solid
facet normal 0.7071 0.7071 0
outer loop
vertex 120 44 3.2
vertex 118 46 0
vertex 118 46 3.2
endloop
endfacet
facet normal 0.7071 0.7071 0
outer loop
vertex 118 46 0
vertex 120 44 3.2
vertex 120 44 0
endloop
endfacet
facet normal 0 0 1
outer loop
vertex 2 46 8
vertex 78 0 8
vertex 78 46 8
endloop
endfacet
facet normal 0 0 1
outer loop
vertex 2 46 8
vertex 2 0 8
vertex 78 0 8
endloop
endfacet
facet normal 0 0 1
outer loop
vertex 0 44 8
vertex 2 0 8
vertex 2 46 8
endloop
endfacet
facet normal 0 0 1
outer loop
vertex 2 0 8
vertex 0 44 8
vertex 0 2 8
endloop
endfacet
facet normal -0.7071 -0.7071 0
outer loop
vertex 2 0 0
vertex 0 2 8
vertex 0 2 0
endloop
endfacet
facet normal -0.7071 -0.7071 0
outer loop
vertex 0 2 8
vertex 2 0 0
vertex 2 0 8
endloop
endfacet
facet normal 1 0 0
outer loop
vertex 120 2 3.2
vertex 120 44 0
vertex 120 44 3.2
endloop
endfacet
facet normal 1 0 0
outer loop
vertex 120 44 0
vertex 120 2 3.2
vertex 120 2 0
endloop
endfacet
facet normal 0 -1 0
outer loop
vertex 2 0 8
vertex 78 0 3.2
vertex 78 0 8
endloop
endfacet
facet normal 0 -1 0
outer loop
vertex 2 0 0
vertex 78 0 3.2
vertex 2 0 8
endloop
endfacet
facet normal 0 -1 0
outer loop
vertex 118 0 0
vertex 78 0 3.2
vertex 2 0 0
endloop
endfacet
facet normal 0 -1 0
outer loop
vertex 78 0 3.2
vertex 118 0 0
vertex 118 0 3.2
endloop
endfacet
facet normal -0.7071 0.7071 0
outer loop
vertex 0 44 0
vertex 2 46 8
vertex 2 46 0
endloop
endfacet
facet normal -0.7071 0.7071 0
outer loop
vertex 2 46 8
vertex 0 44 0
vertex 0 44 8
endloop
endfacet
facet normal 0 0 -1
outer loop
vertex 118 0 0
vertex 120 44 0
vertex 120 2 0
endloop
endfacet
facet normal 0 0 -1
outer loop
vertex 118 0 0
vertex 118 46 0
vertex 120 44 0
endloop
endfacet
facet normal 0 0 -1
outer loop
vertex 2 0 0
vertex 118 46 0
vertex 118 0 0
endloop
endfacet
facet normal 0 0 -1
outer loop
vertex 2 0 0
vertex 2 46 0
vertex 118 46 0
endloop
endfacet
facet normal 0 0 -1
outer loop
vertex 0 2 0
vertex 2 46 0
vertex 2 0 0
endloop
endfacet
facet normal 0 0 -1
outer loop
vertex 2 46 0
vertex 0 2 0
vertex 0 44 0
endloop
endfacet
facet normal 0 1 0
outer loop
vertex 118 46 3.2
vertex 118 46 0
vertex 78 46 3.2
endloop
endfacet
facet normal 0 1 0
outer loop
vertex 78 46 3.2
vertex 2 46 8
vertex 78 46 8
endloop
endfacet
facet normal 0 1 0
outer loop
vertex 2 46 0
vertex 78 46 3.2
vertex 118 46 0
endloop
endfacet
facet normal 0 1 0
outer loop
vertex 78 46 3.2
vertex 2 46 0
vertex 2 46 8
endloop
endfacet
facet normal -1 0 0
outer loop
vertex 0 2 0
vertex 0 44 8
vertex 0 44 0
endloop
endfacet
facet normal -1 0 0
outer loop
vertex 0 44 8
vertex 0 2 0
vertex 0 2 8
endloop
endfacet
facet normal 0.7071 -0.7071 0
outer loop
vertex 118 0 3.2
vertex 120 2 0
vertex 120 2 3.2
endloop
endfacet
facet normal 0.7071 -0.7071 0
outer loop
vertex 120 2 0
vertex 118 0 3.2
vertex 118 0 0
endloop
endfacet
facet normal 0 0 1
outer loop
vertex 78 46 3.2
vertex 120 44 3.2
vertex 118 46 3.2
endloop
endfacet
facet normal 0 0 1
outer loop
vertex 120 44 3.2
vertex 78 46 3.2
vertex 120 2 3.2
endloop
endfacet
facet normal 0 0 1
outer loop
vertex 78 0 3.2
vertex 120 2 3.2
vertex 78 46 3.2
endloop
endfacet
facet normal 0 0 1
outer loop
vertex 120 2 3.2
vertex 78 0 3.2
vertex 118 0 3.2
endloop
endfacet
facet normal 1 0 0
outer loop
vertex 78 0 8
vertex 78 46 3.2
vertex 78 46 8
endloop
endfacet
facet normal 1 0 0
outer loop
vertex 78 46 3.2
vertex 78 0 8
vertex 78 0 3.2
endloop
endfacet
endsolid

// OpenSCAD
$fn = 32;

// ----------------------------------------------------------------------
// Stepped bar: endstep, 120 x 46 x 8/3.2 mm
// ----------------------------------------------------------------------

// --- parameters (mm) ---
bar_l = 120;              // bar length, X
bar_w = 46;               // bar width, Y
plate_t = 8;              // thickness of the thick zone, Z
thin_t = 3.2;             // thickness of the thin zone
corner_c = 2;             // corner chamfer of the bar
step_cut = 4.8;           // material removed from the thin zone
step_x = 78;              // step position from the left end
depth_1 = 4.8;            // depth of cut 1 from the top face

profile = [[2, 0], [118, 0], [120, 2], [120, 44], [118, 46], [2, 46], [0, 44], [0, 2]];  // primary outline, 8 points, counter clockwise
void_1 = [[78, -1], [121, -1], [121, 47], [78, 47]];  // thin zone beyond the step, 4 points

// --- the one profile operation ---
difference() {
  linear_extrude(height = plate_t) polygon(points = profile);
  translate([0, 0, plate_t - depth_1])
    linear_extrude(height = depth_1 + 1) polygon(points = void_1);
}
